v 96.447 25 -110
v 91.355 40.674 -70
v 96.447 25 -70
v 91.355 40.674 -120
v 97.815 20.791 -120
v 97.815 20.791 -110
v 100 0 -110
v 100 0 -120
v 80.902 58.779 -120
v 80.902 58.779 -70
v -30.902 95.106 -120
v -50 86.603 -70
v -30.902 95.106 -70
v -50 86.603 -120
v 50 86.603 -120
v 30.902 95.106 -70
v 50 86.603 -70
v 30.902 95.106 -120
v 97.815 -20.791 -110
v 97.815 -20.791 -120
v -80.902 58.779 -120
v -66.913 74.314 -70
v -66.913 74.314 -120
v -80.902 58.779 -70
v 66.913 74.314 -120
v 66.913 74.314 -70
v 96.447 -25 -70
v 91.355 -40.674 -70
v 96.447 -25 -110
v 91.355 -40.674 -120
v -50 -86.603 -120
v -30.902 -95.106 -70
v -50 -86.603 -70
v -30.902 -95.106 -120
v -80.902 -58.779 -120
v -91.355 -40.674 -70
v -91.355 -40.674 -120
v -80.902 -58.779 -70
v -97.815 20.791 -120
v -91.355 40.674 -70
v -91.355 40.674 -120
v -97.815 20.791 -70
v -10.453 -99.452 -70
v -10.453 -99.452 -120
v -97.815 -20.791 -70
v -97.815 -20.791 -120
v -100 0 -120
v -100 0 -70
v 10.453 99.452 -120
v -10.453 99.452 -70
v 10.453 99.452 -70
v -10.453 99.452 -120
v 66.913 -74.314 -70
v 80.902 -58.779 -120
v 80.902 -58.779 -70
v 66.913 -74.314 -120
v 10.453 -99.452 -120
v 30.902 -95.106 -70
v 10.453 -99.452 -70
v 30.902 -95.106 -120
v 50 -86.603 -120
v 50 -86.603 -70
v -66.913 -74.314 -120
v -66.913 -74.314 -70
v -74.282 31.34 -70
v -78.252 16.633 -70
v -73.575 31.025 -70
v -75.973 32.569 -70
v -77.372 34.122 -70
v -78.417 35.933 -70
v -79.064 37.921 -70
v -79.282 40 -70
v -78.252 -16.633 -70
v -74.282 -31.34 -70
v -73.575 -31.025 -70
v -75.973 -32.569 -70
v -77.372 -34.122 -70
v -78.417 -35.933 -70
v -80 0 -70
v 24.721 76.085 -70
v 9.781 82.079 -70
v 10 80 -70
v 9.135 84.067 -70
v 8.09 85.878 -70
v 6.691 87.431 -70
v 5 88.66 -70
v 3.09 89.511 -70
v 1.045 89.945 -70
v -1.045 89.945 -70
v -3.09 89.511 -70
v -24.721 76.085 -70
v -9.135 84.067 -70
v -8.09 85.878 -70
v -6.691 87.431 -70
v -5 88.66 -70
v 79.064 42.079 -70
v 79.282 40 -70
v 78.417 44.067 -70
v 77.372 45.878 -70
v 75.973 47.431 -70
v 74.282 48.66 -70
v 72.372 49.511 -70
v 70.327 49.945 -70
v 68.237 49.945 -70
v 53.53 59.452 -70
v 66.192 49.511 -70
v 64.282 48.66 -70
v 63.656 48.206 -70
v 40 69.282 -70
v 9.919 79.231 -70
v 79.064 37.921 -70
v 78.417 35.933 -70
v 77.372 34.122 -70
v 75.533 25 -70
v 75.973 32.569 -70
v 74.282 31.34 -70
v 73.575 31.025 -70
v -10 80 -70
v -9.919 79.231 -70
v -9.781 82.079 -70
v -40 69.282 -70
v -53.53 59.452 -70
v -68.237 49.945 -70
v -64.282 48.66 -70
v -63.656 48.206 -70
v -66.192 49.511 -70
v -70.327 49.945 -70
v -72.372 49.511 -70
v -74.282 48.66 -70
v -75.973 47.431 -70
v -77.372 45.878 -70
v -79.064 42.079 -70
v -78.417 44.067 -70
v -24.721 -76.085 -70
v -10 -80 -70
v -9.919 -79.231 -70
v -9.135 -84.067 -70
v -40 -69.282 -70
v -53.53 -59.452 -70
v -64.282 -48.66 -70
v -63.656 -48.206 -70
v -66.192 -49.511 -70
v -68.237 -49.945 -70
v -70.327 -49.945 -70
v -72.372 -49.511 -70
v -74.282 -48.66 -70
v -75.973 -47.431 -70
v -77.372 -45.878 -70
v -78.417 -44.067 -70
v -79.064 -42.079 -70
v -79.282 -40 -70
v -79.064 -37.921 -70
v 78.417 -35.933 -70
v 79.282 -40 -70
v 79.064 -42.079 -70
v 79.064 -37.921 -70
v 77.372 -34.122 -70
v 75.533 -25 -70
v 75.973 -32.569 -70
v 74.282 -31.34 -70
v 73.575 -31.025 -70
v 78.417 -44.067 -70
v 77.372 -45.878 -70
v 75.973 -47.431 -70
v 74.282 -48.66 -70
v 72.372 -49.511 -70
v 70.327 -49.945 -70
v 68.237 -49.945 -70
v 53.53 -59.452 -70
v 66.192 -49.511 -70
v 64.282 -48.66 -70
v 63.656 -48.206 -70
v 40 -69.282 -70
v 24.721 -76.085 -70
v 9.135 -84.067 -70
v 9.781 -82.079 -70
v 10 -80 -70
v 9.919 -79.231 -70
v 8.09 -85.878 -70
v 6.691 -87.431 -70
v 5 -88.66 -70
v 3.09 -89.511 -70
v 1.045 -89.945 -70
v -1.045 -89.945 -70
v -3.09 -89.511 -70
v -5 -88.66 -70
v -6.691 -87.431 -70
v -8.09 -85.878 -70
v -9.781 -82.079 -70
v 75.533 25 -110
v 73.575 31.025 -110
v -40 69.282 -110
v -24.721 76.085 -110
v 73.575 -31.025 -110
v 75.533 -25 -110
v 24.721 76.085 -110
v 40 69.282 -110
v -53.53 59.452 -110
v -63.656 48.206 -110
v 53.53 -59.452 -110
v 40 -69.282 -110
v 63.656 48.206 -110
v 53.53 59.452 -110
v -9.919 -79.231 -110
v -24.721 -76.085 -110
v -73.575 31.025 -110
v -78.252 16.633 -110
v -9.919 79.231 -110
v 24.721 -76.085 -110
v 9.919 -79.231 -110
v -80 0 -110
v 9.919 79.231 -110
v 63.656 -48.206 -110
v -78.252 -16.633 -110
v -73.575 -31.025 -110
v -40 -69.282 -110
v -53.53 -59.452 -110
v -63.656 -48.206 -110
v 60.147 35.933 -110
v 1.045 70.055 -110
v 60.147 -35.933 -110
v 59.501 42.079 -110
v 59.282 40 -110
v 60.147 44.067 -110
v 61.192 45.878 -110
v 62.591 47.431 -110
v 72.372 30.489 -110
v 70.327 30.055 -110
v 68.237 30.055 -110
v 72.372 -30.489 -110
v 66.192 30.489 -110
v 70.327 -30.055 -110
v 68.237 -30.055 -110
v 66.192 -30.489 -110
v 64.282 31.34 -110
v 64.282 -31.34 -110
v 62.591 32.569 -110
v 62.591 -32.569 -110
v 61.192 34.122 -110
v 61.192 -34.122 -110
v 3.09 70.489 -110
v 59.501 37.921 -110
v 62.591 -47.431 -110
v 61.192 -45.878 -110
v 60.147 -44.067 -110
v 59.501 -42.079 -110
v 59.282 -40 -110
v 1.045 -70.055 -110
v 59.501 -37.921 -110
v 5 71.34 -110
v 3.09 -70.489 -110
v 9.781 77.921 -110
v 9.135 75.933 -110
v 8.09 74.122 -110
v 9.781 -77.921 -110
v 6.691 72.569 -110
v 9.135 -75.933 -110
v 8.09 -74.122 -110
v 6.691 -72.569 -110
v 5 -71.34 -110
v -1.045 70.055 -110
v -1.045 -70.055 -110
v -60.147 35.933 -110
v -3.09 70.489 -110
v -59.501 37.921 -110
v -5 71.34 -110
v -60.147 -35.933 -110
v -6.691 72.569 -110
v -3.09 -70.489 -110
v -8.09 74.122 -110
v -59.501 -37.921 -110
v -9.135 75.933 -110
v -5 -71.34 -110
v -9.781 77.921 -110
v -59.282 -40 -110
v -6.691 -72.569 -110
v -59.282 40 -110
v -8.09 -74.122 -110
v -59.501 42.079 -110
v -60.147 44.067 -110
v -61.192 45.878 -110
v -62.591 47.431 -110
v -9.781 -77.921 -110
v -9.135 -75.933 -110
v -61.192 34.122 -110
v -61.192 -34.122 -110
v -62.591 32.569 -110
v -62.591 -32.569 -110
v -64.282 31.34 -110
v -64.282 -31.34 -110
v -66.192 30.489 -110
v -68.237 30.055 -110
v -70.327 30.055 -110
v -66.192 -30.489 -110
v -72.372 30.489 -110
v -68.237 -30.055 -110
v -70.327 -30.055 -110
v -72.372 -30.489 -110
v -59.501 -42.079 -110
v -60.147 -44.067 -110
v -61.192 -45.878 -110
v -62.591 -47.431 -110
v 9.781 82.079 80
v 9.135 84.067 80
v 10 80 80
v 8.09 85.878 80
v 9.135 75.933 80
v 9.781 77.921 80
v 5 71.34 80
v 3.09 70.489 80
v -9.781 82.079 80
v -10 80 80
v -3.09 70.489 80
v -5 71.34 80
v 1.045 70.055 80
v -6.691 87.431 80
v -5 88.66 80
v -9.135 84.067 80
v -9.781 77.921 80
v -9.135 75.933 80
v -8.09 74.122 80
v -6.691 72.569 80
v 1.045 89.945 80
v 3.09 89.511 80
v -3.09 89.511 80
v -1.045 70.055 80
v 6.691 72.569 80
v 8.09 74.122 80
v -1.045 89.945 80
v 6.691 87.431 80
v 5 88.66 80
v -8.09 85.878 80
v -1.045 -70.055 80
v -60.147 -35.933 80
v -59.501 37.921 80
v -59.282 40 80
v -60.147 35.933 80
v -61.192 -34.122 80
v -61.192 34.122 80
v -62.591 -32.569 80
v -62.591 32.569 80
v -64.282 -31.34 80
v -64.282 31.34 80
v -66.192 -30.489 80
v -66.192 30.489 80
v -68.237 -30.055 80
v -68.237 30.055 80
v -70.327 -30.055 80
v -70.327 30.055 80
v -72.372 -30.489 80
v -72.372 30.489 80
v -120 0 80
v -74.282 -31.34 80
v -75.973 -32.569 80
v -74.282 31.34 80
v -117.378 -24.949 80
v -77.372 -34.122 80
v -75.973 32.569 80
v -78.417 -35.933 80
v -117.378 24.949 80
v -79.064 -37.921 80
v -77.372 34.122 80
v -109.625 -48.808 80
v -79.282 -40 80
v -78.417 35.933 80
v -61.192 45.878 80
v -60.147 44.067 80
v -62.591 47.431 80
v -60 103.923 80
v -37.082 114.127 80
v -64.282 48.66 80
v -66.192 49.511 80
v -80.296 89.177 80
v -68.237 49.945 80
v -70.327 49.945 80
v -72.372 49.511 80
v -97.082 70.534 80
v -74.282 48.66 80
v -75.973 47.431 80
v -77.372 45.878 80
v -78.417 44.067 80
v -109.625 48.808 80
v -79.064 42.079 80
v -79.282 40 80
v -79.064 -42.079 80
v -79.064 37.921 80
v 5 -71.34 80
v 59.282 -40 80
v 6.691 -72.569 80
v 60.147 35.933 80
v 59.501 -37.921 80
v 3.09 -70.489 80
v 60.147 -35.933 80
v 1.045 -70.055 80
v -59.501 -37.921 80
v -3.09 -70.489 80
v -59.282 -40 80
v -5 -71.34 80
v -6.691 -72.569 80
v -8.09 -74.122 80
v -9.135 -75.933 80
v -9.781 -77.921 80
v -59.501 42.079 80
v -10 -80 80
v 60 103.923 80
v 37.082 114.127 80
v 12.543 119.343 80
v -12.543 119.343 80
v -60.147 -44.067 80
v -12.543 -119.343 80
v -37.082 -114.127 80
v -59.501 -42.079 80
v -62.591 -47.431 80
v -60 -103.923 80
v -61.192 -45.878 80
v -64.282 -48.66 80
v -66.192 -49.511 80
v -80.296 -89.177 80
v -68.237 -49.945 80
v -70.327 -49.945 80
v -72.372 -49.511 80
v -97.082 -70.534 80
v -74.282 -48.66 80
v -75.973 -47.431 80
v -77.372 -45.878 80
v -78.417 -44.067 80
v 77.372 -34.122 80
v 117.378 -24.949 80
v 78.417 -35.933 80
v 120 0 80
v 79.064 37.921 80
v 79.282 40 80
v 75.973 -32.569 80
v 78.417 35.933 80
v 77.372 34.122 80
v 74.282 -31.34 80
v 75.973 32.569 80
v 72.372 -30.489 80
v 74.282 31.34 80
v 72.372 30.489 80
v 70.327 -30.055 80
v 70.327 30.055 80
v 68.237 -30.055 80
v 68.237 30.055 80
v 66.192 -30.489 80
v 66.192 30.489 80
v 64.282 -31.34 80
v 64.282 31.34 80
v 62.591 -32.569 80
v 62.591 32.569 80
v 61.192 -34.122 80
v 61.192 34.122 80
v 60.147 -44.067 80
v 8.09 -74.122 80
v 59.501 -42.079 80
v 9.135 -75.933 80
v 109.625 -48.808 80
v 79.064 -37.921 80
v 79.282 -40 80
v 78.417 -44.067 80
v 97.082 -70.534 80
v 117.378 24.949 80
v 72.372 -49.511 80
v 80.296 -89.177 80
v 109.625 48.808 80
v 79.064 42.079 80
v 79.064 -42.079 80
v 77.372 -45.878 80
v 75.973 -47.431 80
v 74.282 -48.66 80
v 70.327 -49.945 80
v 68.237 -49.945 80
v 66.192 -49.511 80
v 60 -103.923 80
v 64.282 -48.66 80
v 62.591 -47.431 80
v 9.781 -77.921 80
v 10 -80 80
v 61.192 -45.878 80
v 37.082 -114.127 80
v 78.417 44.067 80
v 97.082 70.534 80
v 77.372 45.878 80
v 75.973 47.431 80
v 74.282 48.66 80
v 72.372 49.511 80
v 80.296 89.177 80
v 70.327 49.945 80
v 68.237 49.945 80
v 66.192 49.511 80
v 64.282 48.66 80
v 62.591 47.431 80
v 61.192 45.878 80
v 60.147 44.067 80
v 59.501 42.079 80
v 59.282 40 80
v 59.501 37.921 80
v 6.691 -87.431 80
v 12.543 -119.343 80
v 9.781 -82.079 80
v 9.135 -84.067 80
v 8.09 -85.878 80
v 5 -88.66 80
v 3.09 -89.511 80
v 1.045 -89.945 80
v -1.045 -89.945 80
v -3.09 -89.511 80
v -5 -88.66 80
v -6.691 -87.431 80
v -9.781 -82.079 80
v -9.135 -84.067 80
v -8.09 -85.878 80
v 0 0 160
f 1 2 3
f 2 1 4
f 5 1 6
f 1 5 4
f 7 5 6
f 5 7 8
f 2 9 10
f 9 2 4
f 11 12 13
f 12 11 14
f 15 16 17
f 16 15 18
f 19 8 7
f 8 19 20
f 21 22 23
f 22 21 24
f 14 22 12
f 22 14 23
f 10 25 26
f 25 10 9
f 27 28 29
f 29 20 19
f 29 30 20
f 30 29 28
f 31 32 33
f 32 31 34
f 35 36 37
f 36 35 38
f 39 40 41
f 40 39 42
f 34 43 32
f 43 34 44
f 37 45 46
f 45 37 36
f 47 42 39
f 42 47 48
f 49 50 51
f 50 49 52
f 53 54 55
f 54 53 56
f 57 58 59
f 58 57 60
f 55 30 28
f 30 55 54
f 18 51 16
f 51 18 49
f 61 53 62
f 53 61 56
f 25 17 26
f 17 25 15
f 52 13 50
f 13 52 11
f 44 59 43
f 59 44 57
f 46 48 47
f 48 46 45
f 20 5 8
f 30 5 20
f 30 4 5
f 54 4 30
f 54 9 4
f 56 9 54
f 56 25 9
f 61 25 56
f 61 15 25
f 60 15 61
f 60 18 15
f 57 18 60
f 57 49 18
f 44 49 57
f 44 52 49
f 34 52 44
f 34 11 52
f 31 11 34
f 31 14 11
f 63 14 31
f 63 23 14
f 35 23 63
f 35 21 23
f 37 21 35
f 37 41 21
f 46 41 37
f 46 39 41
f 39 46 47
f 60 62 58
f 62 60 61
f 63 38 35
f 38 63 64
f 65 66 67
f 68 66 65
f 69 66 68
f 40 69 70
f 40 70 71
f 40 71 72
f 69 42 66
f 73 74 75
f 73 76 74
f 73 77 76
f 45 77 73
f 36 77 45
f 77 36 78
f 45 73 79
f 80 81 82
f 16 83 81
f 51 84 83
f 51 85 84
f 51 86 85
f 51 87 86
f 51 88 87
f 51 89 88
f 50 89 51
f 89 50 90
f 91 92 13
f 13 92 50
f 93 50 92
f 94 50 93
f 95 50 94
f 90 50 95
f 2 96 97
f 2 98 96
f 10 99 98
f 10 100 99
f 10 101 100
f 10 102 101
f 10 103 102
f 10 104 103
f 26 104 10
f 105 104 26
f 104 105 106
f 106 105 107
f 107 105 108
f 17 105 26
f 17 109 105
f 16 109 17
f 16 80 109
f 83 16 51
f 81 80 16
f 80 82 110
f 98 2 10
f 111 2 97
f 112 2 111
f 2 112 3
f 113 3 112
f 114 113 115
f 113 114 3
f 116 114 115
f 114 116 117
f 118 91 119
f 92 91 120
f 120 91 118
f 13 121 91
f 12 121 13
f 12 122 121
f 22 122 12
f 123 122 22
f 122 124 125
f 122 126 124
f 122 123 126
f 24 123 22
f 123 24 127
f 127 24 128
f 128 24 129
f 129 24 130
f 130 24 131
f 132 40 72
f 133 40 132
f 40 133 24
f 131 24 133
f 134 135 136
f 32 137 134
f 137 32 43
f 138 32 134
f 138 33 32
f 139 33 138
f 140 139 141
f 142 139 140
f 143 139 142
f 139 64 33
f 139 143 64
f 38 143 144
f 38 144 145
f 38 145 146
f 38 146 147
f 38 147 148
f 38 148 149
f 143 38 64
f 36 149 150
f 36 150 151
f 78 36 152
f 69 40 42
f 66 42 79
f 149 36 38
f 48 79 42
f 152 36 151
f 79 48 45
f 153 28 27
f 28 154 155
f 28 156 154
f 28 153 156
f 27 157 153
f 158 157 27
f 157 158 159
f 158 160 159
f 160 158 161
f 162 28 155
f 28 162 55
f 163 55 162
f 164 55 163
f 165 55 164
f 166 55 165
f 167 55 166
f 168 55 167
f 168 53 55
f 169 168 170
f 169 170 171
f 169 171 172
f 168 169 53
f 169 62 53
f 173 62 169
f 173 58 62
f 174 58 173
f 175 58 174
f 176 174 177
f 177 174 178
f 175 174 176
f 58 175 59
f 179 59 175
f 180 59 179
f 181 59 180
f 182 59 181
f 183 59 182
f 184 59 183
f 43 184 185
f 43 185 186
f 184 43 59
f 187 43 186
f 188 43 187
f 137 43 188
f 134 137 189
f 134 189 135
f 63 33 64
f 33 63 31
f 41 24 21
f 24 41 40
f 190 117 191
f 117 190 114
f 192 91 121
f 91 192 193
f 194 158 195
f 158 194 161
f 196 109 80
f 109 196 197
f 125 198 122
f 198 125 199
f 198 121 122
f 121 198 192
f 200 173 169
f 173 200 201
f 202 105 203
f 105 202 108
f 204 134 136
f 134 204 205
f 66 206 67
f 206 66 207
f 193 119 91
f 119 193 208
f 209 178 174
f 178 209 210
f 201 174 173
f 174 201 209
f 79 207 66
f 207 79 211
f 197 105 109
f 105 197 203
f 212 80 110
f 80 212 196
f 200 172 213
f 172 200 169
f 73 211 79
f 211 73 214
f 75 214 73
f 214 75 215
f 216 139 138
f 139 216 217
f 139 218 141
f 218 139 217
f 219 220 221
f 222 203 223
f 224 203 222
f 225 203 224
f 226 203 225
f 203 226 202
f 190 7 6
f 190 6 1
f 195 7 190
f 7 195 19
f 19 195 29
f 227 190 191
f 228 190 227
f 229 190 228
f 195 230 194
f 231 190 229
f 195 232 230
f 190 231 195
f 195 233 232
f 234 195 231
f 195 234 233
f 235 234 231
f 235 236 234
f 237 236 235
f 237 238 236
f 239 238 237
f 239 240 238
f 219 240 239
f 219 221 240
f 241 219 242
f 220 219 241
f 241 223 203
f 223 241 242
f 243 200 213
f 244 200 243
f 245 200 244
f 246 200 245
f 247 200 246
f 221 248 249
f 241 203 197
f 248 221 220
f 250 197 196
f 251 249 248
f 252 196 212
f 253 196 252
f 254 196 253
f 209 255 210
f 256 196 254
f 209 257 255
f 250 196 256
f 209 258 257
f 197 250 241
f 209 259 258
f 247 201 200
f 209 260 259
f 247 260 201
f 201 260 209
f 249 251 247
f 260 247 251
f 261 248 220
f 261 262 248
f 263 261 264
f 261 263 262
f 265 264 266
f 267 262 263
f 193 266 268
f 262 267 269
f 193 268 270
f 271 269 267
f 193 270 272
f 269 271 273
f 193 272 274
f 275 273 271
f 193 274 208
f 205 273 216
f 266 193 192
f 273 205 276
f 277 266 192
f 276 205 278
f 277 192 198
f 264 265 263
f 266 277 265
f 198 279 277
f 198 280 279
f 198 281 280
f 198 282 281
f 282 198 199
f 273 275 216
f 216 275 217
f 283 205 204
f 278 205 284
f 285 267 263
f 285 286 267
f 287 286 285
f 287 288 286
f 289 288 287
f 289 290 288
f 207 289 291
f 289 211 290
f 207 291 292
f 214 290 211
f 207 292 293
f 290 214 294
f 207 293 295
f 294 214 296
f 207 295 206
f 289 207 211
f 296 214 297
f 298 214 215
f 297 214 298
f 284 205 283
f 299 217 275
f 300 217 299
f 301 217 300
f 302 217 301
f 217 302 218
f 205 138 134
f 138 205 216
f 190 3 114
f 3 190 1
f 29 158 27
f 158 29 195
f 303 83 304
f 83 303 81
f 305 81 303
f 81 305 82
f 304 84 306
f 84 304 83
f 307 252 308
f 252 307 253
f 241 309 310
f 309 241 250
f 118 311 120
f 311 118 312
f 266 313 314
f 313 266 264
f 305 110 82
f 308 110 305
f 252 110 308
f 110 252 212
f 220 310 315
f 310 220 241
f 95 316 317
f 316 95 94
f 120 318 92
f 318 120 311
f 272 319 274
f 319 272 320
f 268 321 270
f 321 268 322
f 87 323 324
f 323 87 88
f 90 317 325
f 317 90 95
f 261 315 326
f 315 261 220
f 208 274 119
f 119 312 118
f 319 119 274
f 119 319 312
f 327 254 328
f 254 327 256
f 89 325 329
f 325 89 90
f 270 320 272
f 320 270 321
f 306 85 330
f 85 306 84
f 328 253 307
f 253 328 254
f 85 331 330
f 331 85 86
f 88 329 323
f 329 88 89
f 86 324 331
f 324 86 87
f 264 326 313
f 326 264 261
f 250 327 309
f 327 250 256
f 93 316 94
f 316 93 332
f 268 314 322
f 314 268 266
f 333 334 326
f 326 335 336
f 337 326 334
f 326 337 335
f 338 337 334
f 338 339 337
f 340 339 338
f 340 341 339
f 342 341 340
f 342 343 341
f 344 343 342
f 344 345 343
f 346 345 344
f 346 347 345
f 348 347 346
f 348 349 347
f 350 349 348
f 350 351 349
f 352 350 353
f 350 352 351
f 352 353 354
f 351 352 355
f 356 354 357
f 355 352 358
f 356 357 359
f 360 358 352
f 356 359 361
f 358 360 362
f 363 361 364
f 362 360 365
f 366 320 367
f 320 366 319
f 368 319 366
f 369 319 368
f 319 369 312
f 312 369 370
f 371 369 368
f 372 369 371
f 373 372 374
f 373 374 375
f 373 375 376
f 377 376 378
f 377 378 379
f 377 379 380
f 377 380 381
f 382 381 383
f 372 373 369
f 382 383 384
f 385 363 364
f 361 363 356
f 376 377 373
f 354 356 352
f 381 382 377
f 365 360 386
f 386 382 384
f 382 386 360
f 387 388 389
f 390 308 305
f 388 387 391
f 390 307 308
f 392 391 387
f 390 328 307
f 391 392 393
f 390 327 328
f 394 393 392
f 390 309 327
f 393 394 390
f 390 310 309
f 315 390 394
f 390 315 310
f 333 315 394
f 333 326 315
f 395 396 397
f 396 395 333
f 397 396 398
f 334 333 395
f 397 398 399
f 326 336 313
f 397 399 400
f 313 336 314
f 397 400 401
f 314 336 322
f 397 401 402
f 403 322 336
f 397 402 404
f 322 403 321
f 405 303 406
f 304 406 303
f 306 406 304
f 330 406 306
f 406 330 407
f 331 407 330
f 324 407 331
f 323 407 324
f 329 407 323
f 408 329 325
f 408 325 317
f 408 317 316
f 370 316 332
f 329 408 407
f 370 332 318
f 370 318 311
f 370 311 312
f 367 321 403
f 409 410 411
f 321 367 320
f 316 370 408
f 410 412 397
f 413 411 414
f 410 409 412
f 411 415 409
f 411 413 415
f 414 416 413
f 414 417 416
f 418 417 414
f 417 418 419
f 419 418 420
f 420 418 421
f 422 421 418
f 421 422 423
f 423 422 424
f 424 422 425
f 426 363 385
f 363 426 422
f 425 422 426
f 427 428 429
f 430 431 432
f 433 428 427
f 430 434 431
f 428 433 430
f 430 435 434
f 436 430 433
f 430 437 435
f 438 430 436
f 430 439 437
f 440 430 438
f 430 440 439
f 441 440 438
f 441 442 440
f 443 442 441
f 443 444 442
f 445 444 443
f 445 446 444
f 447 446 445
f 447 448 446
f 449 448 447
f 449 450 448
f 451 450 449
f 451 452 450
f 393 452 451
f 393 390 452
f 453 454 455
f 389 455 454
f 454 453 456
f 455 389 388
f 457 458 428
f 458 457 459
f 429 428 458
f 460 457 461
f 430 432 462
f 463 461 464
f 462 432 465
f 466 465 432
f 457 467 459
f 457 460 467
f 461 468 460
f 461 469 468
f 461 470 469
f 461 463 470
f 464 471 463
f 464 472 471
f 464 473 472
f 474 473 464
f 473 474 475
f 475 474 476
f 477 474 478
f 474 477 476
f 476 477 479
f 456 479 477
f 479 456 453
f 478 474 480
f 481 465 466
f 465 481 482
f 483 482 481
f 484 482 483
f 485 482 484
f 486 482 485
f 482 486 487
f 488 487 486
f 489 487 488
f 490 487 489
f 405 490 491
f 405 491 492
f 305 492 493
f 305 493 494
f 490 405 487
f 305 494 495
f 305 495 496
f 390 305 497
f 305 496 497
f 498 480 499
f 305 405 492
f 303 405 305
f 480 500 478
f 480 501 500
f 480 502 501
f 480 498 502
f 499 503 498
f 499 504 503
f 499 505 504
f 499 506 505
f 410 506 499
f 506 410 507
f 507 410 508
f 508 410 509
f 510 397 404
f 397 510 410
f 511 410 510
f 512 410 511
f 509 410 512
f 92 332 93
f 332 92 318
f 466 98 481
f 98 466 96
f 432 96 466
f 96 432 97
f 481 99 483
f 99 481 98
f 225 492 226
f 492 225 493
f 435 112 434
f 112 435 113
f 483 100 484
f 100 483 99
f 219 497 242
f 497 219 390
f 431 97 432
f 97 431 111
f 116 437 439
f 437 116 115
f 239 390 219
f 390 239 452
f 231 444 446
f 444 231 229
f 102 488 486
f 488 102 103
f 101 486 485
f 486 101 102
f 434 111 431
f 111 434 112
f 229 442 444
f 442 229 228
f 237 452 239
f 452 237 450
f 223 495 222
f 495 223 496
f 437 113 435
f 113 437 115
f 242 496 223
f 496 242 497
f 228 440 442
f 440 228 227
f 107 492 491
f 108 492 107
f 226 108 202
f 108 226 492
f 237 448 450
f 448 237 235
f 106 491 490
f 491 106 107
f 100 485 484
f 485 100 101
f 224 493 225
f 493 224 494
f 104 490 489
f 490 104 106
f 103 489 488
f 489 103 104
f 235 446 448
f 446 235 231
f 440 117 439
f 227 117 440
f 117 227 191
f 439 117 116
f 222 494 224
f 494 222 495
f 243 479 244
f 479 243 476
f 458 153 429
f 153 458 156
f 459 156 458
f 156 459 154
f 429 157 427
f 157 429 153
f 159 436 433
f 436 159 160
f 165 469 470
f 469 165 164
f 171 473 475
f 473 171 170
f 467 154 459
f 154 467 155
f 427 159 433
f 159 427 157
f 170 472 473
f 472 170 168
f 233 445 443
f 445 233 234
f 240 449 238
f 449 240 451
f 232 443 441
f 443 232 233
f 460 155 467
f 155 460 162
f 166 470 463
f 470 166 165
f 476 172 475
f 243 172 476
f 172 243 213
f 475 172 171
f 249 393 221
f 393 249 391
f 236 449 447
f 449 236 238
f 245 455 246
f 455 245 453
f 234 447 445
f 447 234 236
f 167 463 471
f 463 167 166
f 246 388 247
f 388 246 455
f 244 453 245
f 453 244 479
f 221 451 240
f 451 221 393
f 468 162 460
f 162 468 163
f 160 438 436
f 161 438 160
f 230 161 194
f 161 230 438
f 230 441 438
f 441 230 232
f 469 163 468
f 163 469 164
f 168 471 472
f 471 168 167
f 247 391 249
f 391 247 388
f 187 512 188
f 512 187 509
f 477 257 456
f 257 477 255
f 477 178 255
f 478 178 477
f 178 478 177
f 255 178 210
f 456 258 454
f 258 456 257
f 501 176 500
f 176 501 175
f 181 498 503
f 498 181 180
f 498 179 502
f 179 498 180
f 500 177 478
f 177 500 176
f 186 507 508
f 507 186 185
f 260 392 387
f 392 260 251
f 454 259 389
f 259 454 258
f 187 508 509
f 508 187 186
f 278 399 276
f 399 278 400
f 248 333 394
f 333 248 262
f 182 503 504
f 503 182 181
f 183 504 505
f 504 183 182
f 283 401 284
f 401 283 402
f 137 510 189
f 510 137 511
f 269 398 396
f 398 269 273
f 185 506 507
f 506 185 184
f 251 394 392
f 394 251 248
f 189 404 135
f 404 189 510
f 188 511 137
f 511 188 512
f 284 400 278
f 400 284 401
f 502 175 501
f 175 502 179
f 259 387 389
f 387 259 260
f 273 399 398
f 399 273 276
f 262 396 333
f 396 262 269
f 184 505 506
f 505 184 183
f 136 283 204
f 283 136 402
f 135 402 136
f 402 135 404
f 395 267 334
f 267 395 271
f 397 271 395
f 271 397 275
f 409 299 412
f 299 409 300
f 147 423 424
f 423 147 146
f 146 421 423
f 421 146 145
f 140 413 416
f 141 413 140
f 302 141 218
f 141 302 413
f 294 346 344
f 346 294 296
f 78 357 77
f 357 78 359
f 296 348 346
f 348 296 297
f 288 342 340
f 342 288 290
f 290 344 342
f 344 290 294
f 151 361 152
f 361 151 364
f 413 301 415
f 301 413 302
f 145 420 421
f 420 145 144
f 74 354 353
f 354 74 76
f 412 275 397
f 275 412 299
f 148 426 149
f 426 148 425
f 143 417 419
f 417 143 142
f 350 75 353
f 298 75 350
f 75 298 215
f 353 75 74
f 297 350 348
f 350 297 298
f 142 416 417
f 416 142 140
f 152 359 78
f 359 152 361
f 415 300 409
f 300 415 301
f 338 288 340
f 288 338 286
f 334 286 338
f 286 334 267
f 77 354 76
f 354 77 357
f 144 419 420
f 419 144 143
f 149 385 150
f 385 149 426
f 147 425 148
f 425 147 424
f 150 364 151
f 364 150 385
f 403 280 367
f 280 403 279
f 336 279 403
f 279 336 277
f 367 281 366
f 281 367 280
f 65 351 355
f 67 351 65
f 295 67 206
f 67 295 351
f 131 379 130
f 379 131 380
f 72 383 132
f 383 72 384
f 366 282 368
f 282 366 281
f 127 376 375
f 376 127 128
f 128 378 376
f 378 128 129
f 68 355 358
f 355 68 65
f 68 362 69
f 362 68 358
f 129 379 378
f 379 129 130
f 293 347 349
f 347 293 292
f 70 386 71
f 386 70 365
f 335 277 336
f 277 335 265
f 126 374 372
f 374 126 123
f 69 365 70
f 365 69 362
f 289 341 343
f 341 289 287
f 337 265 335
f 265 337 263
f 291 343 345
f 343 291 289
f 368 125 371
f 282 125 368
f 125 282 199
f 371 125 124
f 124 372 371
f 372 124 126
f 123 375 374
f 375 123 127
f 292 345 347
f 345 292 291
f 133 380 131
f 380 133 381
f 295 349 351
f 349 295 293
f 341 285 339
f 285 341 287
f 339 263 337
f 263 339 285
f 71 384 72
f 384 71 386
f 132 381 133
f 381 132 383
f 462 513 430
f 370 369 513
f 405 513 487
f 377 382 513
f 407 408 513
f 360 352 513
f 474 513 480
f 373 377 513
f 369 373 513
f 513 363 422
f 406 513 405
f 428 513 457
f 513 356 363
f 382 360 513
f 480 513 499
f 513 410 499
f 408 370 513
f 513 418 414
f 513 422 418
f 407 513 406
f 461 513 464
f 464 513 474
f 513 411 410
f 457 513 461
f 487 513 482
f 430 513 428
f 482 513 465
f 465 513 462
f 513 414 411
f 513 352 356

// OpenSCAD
/*
 *  OpenSCAD (www.openscad.org)
 *  Copyright (C) 2009-2011 Clifford Wolf <clifford@clifford.at> and
 *                          Marius Kintel <marius@kintel.net>
 *
 *  This program is free software; you can redistribute it and/or modify
 *  it under the terms of the GNU General Public License as published by
 *  the Free Software Foundation; either version 2 of the License, or
 *  (at your option) any later version.
 *
 *  This program is distributed in the hope that it will be useful,
 *  but WITHOUT ANY WARRANTY; without even the implied warranty of
 *  MERCHANTABILITY or FITNESS FOR A PARTICULAR PURPOSE.  See the
 *  GNU General Public License for more details.
 *
 *  You should have received a copy of the GNU General Public License
 *  along with this program; if not, write to the Free Software
 *  Foundation, Inc., 59 Temple Place, Suite 330, Boston, MA  02111-1307  USA
 *
 */

module example005()
{
	translate([0, 0, -120]) {
		difference() {
			cylinder(h = 50, r = 100);
			translate([0, 0, 10]) cylinder(h = 50, r = 80);
			translate([100, 0, 35]) cube(50, center = true);
		}
		for (i = [0:5]) {
			echo(360*i/6, sin(360*i/6)*80, cos(360*i/6)*80);
			translate([sin(360*i/6)*80, cos(360*i/6)*80, 0 ])
				cylinder(h = 200, r=10);
		}
		translate([0, 0, 200])
			cylinder(h = 80, r1 = 120, r2 = 0);
	}
}

example005();
